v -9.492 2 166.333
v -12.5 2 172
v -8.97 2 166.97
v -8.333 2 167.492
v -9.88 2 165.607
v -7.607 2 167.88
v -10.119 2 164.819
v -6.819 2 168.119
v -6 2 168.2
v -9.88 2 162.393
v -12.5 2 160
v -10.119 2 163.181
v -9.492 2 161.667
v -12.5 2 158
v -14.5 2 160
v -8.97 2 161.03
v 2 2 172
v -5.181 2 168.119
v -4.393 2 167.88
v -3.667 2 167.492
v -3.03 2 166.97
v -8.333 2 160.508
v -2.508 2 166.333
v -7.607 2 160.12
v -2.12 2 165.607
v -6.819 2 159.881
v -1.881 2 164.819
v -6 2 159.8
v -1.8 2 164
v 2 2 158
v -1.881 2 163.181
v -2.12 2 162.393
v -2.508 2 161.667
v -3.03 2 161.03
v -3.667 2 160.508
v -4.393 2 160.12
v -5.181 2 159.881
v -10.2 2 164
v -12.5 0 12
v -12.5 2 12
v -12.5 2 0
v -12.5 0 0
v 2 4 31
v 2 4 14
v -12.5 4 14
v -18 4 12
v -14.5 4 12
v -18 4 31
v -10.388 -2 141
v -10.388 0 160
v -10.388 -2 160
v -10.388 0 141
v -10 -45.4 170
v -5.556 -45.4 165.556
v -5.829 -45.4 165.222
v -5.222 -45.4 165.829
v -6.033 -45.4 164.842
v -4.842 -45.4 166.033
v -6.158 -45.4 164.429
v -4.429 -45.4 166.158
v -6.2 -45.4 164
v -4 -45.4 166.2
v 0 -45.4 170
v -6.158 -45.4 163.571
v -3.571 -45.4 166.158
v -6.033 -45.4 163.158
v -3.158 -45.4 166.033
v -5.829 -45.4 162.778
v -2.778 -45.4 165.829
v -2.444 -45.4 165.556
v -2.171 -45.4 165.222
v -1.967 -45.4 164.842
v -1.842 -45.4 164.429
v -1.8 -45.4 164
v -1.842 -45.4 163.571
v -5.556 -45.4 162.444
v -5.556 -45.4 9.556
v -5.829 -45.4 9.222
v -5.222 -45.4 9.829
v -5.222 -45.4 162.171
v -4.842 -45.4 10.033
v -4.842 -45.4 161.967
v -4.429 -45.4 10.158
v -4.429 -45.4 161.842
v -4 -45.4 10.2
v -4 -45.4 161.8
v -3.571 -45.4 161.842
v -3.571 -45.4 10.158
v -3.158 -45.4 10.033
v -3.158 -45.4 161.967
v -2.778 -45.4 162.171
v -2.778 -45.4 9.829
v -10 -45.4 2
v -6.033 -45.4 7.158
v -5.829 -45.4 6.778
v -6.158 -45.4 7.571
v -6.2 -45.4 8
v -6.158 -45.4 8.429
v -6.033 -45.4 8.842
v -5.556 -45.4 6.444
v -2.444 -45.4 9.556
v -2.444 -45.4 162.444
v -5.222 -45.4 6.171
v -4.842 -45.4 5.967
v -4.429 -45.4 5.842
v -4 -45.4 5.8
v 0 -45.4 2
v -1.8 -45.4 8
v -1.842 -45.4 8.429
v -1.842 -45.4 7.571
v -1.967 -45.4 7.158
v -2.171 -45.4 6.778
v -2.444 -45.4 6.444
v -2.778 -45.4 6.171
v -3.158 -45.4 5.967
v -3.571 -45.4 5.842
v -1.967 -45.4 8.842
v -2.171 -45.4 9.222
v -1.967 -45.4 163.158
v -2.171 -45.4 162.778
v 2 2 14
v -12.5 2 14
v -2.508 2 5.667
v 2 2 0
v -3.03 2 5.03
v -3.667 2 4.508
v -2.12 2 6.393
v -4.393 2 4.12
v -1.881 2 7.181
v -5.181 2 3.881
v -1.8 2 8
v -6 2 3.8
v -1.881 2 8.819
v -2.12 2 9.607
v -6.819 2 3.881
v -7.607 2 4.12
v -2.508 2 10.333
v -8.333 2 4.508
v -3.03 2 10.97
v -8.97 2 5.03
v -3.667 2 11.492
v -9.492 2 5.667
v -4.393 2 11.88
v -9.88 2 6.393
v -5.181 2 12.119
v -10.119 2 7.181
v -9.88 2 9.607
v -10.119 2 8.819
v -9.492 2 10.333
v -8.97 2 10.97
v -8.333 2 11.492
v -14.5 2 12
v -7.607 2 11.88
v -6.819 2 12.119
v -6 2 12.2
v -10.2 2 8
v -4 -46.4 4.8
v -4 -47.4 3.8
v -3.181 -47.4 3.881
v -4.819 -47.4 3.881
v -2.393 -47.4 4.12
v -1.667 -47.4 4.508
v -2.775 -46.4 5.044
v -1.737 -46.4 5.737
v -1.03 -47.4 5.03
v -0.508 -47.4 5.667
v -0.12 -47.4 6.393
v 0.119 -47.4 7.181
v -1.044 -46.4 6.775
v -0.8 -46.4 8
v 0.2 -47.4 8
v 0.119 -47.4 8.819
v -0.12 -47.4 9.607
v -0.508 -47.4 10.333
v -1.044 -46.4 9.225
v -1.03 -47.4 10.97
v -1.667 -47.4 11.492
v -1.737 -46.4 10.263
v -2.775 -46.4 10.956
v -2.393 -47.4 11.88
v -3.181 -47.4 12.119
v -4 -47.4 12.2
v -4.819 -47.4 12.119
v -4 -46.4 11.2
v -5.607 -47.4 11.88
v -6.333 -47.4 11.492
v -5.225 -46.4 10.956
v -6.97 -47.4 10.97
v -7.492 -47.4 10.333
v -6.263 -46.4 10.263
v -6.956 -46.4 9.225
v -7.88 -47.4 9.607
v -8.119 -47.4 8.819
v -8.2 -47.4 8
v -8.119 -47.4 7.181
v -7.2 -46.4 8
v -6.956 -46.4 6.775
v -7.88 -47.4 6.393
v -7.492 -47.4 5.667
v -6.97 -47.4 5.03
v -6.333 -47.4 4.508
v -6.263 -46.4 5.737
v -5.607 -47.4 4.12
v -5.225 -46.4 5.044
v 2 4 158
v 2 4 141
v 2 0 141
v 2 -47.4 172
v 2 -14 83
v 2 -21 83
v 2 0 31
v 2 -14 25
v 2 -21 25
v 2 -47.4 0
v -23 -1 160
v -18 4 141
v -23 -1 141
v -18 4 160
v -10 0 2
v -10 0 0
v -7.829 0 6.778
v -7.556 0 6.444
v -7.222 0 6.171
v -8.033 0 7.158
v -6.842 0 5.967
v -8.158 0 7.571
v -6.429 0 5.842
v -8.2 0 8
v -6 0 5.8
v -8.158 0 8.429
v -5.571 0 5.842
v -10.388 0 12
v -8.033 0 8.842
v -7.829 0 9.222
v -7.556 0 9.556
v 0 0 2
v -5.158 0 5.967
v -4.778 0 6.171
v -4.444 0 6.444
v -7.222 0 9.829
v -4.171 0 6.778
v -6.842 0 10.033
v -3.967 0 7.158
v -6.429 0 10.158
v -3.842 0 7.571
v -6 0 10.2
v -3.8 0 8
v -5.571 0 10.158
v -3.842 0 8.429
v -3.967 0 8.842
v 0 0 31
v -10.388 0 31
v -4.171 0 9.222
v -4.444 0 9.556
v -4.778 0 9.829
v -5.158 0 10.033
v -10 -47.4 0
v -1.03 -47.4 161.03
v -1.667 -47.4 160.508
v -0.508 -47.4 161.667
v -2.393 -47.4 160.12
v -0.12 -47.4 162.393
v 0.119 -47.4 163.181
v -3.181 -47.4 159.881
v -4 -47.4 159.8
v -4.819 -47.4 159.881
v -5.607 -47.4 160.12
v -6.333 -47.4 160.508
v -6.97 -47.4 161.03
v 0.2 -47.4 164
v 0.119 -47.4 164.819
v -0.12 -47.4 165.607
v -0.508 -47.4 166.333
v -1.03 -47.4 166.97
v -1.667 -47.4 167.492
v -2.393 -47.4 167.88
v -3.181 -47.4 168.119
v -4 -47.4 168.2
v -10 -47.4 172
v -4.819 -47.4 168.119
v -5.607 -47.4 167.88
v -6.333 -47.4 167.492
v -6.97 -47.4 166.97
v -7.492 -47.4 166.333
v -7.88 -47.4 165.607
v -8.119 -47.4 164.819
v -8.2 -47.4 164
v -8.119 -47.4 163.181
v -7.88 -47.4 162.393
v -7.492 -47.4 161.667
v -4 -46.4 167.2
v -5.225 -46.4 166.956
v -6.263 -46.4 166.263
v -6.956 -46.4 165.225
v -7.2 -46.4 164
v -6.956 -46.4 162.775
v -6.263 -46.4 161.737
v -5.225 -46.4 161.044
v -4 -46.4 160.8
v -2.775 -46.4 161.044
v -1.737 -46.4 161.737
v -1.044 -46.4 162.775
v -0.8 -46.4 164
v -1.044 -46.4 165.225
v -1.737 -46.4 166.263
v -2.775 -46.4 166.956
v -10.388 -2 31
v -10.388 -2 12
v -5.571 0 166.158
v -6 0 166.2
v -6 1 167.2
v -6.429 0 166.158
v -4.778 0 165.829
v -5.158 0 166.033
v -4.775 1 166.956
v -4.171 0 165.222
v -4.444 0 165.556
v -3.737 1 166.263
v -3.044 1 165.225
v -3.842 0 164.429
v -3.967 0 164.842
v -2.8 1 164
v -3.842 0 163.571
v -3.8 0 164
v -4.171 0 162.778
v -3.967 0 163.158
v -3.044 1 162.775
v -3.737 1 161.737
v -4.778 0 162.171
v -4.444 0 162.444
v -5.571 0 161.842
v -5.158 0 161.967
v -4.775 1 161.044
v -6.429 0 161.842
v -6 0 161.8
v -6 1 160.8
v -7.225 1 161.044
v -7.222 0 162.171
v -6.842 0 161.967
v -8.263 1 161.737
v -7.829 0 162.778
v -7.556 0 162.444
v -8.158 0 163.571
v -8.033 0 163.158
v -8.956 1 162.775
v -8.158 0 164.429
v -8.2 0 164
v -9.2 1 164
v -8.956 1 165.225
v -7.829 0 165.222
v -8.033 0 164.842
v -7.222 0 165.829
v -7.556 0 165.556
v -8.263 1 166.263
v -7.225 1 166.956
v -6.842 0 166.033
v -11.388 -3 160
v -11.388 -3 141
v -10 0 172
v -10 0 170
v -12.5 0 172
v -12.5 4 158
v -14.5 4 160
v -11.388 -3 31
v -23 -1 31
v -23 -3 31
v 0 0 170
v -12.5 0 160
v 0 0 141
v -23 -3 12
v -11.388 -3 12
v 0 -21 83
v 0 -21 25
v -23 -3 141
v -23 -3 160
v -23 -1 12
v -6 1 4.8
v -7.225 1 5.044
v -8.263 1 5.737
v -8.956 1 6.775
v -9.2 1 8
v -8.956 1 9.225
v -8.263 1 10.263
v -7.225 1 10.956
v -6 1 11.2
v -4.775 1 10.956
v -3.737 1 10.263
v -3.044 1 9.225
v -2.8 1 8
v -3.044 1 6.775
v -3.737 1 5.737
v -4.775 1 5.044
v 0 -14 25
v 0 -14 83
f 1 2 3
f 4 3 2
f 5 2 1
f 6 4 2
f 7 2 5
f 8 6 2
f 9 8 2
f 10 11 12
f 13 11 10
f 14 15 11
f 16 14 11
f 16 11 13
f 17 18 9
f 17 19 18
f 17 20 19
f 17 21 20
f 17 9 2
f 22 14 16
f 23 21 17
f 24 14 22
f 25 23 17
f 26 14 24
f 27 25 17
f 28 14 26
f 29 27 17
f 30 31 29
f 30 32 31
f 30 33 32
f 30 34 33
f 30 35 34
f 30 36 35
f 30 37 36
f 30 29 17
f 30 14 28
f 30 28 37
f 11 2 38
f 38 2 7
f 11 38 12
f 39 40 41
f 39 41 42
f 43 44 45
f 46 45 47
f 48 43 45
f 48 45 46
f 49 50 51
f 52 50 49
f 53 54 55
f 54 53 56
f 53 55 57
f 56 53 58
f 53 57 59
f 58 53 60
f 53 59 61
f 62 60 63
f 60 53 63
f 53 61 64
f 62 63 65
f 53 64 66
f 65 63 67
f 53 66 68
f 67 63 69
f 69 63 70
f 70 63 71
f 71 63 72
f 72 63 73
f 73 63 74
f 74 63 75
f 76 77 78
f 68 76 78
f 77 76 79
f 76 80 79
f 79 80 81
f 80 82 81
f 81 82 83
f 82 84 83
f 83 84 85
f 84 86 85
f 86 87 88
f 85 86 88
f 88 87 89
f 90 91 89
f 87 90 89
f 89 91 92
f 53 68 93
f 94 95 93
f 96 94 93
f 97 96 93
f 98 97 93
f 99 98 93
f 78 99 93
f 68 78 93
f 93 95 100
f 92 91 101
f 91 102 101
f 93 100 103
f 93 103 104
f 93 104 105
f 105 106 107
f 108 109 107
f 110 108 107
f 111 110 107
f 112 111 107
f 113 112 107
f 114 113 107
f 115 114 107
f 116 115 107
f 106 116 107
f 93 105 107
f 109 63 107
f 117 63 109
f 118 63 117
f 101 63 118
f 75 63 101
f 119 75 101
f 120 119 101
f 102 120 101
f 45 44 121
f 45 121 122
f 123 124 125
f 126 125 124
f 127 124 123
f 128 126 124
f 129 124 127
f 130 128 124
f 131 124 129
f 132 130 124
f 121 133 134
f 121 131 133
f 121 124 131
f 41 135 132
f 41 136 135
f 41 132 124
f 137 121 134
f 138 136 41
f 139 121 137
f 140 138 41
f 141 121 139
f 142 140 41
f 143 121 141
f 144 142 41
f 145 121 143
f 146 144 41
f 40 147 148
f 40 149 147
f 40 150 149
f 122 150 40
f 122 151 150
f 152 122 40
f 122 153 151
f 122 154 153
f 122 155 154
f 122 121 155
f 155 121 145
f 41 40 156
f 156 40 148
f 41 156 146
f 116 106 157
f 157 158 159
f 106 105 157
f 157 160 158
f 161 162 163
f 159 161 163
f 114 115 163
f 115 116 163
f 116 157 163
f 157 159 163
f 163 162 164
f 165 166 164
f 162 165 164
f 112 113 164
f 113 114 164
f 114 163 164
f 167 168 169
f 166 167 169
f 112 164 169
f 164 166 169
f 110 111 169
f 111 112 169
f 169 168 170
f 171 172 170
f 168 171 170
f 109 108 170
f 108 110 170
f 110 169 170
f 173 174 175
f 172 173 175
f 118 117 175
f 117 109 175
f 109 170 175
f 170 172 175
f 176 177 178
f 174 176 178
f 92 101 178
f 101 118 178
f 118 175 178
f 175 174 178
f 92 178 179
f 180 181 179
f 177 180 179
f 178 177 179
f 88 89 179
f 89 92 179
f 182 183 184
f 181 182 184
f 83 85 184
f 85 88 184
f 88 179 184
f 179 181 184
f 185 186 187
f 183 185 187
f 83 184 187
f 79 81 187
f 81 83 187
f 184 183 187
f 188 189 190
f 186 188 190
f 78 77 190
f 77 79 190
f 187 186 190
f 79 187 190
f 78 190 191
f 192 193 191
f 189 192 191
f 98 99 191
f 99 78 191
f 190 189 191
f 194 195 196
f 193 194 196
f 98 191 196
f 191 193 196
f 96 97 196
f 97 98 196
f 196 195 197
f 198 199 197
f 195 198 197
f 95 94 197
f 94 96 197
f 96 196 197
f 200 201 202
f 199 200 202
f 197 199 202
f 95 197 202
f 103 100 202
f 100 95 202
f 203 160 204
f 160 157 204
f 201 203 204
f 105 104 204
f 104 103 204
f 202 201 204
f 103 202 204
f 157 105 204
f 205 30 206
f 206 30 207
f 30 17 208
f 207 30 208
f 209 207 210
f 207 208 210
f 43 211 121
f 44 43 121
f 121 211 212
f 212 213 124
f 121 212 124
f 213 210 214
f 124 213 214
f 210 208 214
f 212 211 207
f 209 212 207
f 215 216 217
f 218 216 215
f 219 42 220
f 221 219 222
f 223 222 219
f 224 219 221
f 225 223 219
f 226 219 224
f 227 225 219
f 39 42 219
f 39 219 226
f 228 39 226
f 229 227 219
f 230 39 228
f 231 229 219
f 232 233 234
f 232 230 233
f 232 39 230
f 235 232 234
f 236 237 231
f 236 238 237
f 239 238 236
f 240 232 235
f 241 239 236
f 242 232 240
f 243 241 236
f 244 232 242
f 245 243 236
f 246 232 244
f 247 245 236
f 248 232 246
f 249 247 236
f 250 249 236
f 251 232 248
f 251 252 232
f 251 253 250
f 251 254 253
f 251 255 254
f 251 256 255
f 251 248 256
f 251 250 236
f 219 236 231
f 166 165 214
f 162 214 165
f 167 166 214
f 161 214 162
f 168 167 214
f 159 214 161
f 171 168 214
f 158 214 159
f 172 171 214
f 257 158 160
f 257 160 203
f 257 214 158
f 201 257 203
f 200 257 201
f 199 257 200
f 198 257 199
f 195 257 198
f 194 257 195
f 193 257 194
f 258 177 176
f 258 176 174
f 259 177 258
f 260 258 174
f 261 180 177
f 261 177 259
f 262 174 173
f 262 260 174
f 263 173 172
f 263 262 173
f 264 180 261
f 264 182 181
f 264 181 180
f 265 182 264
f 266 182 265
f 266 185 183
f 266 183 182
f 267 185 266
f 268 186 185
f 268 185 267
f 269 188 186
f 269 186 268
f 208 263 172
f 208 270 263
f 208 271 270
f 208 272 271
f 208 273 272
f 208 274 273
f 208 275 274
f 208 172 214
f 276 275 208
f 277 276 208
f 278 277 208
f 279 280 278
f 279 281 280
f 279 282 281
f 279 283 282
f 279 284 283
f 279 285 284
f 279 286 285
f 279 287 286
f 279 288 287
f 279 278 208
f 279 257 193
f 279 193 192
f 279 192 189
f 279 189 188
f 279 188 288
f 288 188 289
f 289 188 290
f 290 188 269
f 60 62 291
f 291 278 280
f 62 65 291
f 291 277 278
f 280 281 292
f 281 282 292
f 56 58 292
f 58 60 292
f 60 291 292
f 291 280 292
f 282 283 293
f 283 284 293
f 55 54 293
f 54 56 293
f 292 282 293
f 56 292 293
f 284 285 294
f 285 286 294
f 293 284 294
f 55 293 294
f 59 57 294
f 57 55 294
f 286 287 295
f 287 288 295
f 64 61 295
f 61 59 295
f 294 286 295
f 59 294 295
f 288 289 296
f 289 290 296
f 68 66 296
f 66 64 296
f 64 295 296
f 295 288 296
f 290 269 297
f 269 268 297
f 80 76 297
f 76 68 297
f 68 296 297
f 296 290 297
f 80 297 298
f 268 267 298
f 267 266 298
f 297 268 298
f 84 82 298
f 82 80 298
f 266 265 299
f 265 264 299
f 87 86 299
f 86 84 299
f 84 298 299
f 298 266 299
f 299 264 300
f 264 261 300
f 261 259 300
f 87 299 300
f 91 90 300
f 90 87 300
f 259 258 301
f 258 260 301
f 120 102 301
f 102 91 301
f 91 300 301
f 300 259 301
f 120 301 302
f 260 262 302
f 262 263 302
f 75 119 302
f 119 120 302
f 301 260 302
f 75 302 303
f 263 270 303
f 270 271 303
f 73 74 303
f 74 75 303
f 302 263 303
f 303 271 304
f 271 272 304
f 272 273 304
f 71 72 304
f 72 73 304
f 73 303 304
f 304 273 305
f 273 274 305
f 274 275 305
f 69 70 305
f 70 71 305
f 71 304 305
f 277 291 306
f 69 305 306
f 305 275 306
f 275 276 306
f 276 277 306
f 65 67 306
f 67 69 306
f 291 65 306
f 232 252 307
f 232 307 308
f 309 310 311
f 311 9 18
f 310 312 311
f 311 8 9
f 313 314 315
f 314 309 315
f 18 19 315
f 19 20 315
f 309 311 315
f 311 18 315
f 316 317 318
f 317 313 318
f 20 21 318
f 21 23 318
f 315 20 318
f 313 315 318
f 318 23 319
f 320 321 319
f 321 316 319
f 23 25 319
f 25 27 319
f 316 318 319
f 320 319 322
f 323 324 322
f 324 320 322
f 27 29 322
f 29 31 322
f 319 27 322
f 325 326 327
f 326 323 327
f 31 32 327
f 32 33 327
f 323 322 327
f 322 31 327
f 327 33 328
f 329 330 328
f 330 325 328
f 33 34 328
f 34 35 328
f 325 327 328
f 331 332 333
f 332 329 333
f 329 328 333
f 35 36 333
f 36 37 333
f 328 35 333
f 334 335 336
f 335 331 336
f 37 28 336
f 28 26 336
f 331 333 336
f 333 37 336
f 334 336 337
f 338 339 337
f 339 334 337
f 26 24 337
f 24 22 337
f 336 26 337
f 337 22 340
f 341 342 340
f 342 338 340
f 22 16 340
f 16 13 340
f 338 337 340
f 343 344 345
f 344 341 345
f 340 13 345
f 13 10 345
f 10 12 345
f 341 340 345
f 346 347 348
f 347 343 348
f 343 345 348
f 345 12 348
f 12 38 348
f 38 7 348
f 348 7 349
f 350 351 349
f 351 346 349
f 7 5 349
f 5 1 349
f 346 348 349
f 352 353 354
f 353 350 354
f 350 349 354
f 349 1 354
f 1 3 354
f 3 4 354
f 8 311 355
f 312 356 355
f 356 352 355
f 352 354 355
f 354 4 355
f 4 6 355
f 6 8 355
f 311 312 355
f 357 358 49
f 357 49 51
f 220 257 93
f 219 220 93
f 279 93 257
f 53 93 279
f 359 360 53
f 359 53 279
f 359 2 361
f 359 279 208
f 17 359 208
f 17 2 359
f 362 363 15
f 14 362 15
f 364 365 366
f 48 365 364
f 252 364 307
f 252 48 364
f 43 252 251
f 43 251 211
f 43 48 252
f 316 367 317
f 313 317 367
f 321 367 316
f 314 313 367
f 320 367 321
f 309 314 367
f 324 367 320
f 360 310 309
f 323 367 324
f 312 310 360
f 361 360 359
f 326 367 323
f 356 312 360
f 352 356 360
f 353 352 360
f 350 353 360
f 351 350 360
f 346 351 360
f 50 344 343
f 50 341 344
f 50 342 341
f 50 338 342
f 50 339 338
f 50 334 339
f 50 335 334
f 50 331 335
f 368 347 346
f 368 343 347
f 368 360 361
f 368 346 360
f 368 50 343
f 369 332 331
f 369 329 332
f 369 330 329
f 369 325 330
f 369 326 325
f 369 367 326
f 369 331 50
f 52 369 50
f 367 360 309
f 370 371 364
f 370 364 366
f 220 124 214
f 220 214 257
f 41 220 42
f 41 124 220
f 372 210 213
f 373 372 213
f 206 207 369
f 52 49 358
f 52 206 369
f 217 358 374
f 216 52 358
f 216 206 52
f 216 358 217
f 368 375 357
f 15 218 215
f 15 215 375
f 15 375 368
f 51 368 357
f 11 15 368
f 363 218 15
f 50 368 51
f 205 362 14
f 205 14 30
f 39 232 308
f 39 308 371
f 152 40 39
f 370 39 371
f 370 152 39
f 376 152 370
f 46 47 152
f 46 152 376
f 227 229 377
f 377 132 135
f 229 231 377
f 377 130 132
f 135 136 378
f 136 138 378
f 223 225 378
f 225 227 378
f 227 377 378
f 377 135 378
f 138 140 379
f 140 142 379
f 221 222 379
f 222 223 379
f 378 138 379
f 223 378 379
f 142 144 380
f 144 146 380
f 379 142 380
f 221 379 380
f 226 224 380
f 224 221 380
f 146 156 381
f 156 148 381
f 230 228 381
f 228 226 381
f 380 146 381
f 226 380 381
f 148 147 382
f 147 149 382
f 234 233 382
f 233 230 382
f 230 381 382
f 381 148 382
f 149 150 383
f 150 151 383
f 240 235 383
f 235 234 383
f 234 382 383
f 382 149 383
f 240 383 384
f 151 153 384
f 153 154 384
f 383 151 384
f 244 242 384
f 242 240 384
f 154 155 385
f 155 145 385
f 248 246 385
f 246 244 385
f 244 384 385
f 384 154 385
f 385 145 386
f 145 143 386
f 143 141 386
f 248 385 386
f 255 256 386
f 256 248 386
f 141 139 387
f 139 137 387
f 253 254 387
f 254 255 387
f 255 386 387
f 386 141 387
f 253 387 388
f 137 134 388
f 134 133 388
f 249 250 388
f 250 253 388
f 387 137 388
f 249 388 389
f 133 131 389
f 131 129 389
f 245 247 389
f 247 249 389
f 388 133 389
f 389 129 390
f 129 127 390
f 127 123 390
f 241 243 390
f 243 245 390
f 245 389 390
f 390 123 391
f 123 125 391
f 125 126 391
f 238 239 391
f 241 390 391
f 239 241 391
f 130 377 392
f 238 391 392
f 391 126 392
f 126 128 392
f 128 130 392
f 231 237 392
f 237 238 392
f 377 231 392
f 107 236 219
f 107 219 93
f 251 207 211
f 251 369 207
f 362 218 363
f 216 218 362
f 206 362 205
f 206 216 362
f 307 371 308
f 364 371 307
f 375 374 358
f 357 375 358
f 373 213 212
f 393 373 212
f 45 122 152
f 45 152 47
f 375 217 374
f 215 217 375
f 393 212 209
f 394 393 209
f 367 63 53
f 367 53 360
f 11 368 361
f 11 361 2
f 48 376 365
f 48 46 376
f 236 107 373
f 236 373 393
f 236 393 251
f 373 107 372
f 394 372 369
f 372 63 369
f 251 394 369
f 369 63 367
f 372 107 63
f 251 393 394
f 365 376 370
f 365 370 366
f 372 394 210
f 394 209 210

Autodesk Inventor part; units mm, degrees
ref_plane "YZ Plane" through (0, 0, 0) normal (1, 0, 0) x (0, 1, 0)
ref_plane "XZ Plane" through (0, 0, 0) normal (0, 1, 0) x (-1, 0, 0)
ref_plane "XY Plane" through (0, 0, 0) normal (0, 0, 1) x (1, 0, 0)
sketch "Sketch1" plane through (0, 0, 0) normal (1, 0, 0) x (0, 1, 0)
  line L0 (0, 0) -> (-47.4, 0)
  line L1 (-47.4, 0) -> (-47.4, 172)
  line L2 (-47.4, 172) -> (0, 172)
  line L3 (0, 172) -> (0, 0)
  dimension "d0" = 172
  dimension "d1" = 47.4
extrude "Extrusion1" add sketch "Sketch1" along normal blind 2
sketch "Sketch2" plane through (0, 0, 0) normal (-1, 0, 0) x (0, 0, 1)
  line L0 (0, 0) -> (172, 0) projected
  line L1 (172, -47.4) -> (0, -47.4) projected
  line L2 (0, 0) -> (2, 0)
  line L3 (2, 0) -> (2, -47.4)
  line L4 (2, -47.4) -> (0, -47.4)
  line L5 (0, -47.4) -> (0, 0)
  line L6 (172, 0) -> (172, -47.4) projected
  line L7 (0, -47.4) -> (172, -47.4)
  line L8 (172, -47.4) -> (172, -45.4)
  line L9 (172, -45.4) -> (0, -45.4)
  line L10 (0, -45.4) -> (0, -47.4)
  line L11 (172, -47.4) -> (170, -47.4)
  line L12 (170, -47.4) -> (170, 0)
  line L13 (170, 0) -> (172, 0)
  line L14 (172, 0) -> (172, -47.4)
  point P0 (2, -45.4)
  point P1 (0, -47.4)
  point P2 (170, -45.4)
  dimension "d4" = 2
  dimension "d5" = 2
  dimension "d6" = 2
extrude "Extrusion2" add sketch "Sketch2" along normal blind 10 contours L0 L3 L9 L5 | L9 L3 L1 L5 | L0 L6 L9 L12 | L9 L12 L1 L3 | L9 L6 L1 L12
sketch "Sketch3" plane through (2, 0, 172) normal (0, 1, 0) x (1, 0, 0)
  line L0 (0, 0) -> (0, 172) projected
  line L1 (0, 12) -> (-25, 12)
  line L2 (-25, 12) -> (-25, 31)
  line L3 (-25, 31) -> (0, 31)
  line L4 (0, 31) -> (0, 12)
  line L5 (-12, 0) -> (0, 0) projected
  point P0 (-2, 172)
  point P1 (0, 31)
  dimension "d9" = 12
  dimension "d10" = 25
  dimension "d11" = 19
extrude "Extrusion3" add sketch "Sketch3" along normal blind 4
sketch "Sketch4" plane through (2, 0, 172) normal (0, -1, 0) x (1, 0, 0)
  line L0 (-2, -31) -> (-2, -12) projected
  line L1 (0, -12) -> (0, -31) projected
  line L2 (0, -31) -> (-25, -31) projected
  line L3 (-25, -31) -> (-25, -12) projected
  line L4 (-25, -12) -> (0, -12) projected
  line L5 (-25, -31) -> (-25, -12) projected
  line L6 (-2, -31) -> (-25, -31) projected
  line L7 (-25, -12) -> (-12.388, -12)
  line L8 (-12.388, -12) -> (-12.388, -31)
  line L9 (-12.388, -31) -> (-25, -31)
  line L10 (-25, -31) -> (-25, -12)
  point P0 (-2, -172)
  point P1 (-12.388, -12)
  dimension "d14" = 12.388
extrude "Extrusion4" add sketch "Sketch4" along normal blind 3 contours L2 L3 L4 L8
chamfer "Chamfer1" distance 1 angle 45 1 edges at (-10.388, -3, 150.5)
chamfer "Chamfer2" distance 5 angle 45 1 edges at (-23, 4, 150.5)
sketch "Sketch5" plane through (0, 0, 160) normal (0, 0, 1) x (1, 0, 0)
  line L0 (0, 0) -> (-10, 0) projected
  line L1 (2, 0) -> (-12.5, 0)
  line L2 (-12.5, 0) -> (-12.5, 2)
  line L3 (-12.5, 2) -> (2, 2)
  line L4 (2, 2) -> (2, 0)
  point P0 (-5, 0)
  dimension "d26" = 14.5
  dimension "d27" = 2
extrude "Extrusion5" add sketch "Sketch5" along normal up to surface (12 mm away)
ref_plane "Work Plane1" through (-10, -47.4, 86) normal (0, 0, 1) x (1, 0, 0)
sketch "Sketch6" plane through (-12.5, 2, 160) normal (0, 1, 0) x (1, 0, 0)
  line L0 (0, -12) -> (14.5, -12) projected
  line L1 (14.5, 0) -> (14.5, -12) projected
  point P0 (12.5, 160)
  point P1 (6.5, -4)
  dimension "d28" = 8
  dimension "d29" = 8
hole "Hole1" at (-6, 2, 164) direction (0, -1, 0) diameter 4 depth 10 tip angle 118 countersink diameter 8.4 countersink angle 90
sketch "Sketch7" plane through (2, 4, 172) normal (0, 1, 0) x (1, 0, 0)
  line L0 (-20, 12) -> (0, 12) projected
  line L1 (0, 12) -> (-14.5, 12)
  line L2 (-14.5, 12) -> (-14.5, 14)
  line L3 (-14.5, 14) -> (0, 14)
  line L4 (0, 14) -> (0, 12)
  point P0 (-2, 172)
  dimension "d37" = 14.5
  dimension "d38" = 2
extrude "Extrusion6" cut sketch "Sketch7" against normal up to surface (2 mm away)
chamfer "Chamfer3" distance 2 angle 45 1 edges at (-12.5, 3, 160)
mirror "Mirror2" about plane through (-10, -47.4, 86) normal (0, 0, 1) of "Extrusion3", "Extrusion5", "Hole1", "Chamfer3", "Chamfer2", "Chamfer1", "Extrusion4", "Extrusion6"
sketch "Sketch8" plane through (2, -47.4, 0) normal (0, -1, 0) x (1, 0, 0)
  circle A0 centre (-8, 164) radius 2.2 projected
  circle A1 centre (-8, 164) radius 4.2 projected
  circle A2 centre (-8, 8) radius 4.2 projected
  circle A3 centre (-8, 8) radius 2.2 projected
  circle A4 centre (-8, 8) radius 4.2 projected
  line L0 (0, 172) -> (0, 0) projected
  point P0 (-2, 0)
  point P1 (-12, 2)
  point P2 (-6, 8)
  dimension "d51" = 6
hole "Hole2" at (-4, -47.4, 8) direction (0, 1, 0) diameter 4 depth 10 tip angle 118 countersink diameter 8.4 countersink angle 90
mirror "Mirror3" about plane through (-10, -47.4, 86) normal (0, 0, 1) of "Hole2"
sketch "Sketch9" plane through (2, 0, 0) normal (1, 0, 0) x (0, 0, -1)
  line L0 (0, 2) -> (-14, 2) projected
  line L1 (0, -47.4) -> (0, 2) projected
  line L2 (-31, 0) -> (-141, 0) projected
  line L3 (-25, -14) -> (-83, -14)
  line L4 (-83, -14) -> (-83, -21)
  line L5 (-83, -21) -> (-25, -21)
  line L6 (-25, -21) -> (-25, -14)
  point P0 (0, 0)
  point P1 (-83, -14)
  dimension "d52" = 16
  dimension "d53" = 25
  dimension "d54" = 14
  dimension "d55" = 58
  dimension "d56" = 7
extrude "Extrusion7" cut sketch "Sketch9" against normal blind 10
properties part number "backplate"
